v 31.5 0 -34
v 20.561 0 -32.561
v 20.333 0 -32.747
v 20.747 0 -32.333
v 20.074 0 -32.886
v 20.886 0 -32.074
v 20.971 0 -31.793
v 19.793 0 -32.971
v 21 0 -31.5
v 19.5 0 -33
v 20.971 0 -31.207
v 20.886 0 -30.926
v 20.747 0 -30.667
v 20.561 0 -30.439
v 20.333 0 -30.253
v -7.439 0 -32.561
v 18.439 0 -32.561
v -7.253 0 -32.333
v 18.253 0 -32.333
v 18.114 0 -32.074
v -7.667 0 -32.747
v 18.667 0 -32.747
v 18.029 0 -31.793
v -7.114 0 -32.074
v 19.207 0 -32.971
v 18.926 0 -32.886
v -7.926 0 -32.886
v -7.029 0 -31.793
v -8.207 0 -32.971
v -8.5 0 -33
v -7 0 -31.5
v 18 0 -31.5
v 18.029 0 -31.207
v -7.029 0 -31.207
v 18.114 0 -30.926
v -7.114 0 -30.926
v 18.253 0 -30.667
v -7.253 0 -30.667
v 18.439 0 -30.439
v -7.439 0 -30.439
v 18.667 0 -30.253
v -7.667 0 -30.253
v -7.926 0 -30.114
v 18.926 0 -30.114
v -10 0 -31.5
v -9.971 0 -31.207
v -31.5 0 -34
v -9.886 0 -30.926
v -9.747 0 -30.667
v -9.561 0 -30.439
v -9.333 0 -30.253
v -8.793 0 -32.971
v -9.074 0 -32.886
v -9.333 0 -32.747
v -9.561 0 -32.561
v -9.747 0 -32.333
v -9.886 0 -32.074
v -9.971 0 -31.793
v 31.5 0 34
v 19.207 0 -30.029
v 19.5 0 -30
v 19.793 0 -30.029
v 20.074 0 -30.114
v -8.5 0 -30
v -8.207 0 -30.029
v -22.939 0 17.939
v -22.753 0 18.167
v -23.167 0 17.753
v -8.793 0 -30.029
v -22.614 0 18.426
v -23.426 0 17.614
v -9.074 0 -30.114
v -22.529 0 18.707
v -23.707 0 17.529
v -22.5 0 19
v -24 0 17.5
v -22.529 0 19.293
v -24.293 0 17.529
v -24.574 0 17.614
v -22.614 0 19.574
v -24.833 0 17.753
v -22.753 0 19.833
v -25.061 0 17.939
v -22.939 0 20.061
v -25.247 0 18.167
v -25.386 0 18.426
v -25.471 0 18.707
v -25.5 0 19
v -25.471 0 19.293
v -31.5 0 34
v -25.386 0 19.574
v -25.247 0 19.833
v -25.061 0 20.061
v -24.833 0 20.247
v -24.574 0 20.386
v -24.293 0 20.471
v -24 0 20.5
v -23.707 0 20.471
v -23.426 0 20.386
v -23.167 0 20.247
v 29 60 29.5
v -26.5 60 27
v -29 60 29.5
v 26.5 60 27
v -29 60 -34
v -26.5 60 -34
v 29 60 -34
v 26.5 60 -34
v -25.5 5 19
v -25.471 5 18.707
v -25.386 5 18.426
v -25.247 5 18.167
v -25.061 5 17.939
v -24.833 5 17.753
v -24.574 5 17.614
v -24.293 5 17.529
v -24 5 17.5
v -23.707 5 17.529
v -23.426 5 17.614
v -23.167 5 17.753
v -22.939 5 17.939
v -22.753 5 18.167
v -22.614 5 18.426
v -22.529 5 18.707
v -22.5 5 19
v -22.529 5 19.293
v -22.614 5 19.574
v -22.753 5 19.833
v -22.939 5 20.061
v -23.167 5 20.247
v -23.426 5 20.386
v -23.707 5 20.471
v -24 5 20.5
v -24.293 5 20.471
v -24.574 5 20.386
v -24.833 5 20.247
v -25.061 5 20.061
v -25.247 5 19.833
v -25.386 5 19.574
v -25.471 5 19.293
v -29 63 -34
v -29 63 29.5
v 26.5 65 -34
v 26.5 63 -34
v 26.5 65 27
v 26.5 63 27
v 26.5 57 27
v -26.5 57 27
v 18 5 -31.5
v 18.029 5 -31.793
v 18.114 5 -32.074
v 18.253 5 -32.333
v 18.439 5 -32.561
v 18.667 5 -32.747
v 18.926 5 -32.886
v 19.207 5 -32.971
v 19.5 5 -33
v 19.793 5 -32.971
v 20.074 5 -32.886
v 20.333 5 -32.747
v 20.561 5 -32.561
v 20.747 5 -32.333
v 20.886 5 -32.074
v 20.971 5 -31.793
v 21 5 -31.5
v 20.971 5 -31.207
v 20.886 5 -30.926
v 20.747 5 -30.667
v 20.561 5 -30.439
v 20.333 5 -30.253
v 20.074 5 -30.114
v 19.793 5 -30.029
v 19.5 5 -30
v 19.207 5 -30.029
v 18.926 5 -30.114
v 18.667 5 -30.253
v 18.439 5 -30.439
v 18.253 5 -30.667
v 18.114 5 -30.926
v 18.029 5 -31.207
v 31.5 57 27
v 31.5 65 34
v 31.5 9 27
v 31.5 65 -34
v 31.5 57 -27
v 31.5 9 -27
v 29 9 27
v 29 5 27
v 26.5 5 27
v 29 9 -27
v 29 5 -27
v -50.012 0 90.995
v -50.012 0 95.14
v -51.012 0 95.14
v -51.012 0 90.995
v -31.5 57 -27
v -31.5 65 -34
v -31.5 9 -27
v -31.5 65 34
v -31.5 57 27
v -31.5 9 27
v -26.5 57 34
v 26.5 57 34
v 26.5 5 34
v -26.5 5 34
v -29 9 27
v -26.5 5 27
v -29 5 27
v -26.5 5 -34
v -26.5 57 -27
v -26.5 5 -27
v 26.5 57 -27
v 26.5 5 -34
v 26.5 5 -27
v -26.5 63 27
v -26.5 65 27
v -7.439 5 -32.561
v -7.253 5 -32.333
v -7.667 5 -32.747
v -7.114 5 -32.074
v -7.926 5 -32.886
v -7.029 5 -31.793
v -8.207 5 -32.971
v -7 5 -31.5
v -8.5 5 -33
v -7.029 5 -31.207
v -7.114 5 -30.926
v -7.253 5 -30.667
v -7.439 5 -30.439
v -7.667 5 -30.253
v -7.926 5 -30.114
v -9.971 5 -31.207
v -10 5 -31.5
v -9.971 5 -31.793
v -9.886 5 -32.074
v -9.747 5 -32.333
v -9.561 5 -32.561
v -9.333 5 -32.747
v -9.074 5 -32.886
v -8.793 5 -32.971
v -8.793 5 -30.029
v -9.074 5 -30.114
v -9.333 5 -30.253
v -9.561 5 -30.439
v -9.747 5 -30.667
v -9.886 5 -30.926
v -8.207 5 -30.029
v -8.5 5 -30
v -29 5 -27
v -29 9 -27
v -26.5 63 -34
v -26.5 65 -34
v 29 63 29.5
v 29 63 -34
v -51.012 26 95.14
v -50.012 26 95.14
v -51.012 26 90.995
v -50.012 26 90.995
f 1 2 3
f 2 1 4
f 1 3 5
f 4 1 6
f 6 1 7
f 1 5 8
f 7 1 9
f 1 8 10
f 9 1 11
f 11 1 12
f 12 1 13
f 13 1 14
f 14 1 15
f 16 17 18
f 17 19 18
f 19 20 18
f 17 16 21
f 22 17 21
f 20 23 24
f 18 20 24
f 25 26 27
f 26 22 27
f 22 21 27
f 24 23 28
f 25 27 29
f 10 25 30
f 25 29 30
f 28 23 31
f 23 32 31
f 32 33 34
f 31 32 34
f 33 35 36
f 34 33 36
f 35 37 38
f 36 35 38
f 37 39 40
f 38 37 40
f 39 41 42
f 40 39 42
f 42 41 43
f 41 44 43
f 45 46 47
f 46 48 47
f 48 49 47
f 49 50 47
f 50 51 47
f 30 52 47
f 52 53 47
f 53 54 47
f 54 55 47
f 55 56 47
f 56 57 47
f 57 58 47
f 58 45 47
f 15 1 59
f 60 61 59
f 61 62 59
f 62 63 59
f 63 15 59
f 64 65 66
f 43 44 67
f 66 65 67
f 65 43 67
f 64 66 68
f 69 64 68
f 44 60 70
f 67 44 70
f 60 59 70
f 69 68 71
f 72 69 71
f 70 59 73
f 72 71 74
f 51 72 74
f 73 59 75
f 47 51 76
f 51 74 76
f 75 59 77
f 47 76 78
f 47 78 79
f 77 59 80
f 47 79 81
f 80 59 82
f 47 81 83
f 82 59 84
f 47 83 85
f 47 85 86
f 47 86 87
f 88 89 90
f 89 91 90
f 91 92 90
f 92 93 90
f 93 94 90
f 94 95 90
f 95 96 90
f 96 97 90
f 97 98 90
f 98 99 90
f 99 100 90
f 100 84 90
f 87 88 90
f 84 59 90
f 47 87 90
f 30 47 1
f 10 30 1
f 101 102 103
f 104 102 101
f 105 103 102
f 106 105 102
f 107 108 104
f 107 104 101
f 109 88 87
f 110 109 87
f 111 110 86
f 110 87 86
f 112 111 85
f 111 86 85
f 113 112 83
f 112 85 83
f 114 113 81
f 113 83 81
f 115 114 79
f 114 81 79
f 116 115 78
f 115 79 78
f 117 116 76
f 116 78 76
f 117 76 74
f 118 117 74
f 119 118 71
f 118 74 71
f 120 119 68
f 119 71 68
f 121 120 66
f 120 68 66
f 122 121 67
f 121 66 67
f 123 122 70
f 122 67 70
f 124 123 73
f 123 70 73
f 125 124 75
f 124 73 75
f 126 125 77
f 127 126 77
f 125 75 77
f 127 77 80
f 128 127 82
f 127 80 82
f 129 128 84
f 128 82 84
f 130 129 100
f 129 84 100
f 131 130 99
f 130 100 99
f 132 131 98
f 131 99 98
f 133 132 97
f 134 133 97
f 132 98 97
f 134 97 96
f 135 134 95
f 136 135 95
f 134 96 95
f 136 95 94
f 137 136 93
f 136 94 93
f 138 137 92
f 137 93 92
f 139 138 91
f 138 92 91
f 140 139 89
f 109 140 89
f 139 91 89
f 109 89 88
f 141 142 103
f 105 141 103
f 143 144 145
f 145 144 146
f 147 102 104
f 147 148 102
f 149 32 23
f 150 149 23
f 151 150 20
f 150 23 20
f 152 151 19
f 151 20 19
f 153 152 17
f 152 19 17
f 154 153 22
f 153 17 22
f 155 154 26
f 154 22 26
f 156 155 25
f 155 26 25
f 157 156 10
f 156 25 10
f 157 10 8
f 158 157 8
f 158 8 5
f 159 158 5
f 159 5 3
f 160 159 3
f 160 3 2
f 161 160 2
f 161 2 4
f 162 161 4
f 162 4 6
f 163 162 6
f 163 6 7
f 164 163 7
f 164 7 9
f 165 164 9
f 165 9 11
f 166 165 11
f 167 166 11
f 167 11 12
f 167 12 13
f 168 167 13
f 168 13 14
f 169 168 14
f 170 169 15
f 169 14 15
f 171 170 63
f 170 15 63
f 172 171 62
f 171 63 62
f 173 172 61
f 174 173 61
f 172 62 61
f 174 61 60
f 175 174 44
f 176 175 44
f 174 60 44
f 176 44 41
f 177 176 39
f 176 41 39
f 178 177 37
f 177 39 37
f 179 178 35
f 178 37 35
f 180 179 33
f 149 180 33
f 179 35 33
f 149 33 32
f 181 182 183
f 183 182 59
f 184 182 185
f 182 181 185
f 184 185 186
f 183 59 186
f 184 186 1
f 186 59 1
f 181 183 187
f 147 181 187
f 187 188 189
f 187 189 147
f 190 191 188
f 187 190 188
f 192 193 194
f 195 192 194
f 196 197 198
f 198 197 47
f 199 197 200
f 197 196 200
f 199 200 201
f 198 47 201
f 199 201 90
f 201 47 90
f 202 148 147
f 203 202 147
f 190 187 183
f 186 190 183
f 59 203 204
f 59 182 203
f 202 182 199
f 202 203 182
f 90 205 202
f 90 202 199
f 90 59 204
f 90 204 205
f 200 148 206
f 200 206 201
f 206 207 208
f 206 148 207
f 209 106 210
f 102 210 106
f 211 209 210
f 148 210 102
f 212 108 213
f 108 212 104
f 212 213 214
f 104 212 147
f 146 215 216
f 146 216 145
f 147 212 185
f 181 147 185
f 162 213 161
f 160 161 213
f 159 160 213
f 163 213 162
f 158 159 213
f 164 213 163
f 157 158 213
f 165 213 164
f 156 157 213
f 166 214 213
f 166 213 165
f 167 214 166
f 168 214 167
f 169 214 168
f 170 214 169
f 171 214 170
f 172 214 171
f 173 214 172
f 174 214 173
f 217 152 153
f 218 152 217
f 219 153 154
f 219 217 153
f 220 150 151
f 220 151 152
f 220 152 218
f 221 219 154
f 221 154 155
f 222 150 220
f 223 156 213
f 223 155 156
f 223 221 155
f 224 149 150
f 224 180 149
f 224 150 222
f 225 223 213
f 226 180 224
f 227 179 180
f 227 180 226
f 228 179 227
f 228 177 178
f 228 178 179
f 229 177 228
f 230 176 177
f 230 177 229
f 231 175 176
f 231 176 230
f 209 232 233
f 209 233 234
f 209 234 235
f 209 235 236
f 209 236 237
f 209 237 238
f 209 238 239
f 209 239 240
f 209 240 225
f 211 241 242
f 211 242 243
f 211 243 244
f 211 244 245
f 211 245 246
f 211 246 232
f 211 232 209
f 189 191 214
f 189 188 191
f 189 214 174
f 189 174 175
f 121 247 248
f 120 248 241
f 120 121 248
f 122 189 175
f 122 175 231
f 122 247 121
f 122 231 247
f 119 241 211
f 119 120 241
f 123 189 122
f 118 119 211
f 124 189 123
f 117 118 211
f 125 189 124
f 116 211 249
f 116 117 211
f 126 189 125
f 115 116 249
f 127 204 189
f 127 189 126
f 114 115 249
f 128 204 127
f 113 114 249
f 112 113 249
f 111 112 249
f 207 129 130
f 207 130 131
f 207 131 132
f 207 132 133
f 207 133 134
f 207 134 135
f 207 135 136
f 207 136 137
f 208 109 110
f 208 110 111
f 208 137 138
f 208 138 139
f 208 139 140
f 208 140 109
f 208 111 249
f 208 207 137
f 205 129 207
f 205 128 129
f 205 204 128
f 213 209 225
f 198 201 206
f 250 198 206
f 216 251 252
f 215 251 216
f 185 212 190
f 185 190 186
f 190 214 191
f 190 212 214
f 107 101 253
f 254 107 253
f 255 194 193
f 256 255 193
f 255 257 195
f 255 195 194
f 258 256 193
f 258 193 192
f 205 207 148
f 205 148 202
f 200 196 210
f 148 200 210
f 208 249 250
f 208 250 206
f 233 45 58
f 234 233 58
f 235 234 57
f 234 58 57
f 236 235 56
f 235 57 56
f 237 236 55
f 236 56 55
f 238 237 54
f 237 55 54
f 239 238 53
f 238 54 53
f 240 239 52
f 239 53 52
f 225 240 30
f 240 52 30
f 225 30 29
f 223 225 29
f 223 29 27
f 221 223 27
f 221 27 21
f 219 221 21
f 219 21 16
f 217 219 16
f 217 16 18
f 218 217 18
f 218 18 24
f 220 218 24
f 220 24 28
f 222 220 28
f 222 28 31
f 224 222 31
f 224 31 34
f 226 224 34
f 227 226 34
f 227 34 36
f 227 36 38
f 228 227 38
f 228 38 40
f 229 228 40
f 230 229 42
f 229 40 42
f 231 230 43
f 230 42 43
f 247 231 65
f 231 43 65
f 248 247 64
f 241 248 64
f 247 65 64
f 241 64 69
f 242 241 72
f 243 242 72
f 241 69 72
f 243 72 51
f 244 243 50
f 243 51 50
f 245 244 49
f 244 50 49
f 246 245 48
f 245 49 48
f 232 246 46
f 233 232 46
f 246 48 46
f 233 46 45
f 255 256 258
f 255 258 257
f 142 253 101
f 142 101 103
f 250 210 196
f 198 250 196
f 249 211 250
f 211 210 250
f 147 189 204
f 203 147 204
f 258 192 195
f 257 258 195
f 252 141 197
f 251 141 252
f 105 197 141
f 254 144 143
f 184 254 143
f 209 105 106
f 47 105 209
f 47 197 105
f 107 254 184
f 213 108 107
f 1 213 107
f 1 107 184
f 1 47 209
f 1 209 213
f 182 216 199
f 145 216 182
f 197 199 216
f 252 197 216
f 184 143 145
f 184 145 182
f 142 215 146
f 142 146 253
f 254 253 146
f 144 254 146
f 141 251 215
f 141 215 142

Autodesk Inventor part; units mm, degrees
ref_plane "YZ Plane" through (0, 0, 0) normal (1, 0, 0) x (0, 1, 0)
ref_plane "XZ Plane" through (0, 0, 0) normal (0, 1, 0) x (-1, 0, 0)
ref_plane "XY Plane" through (0, 0, 0) normal (0, 0, 1) x (1, 0, 0)
sketch "Sketch1" plane through (0, 0, 0) normal (0, 1, 0) x (-1, 0, 0)
  line L0 (-26.5, 34) -> (26.5, 34)
  line L1 (26.5, 34) -> (26.5, -34)
  line L2 (26.5, -34) -> (-26.5, -34)
  line L3 (-26.5, -34) -> (-26.5, 34)
  line L4 (-26.5, 34) -> (26.5, -34) construction
  line L5 (26.5, 34) -> (-26.5, -34) construction
  line L6 (26.5, 34) -> (26.5, 19)
  line L7 (-26.5, -34) -> (-19.5, -34)
  line L8 (-26.5, -34) -> (8.5, -34)
  circle A0 centre (8.5, -31.5) radius 1.5
  circle A1 centre (-19.5, -31.5) radius 1.5
  line L9 (-19.5, -33) -> (-19.5, -34)
  line L10 (8.5, -33) -> (8.5, -34)
  circle A2 centre (-19.5, -31.5) radius 1.5
  circle A3 centre (24, 19) radius 1.5
  line L11 (25.5, 19) -> (26.5, 19)
  line L12 (26.5, 19) -> (25.5, 19)
  line L13 (24, 19) -> (0, 19)
  line L14 (0, 19) -> (0, 0)
  line L15 (0, 0) -> (8.5, -31.5)
  line L16 (8.5, -31.5) -> (0, -31.5)
  line L17 (-19.5, -31.5) -> (-19.5, 0)
  line L18 (-19.5, 0) -> (0, 0)
  line L19 (26.5, 34) -> (31.5, 34)
  line L20 (-31.5, -34) -> (31.5, -34)
  line L21 (31.5, -34) -> (31.5, 34)
  line L22 (31.5, 34) -> (-31.5, 34)
  line L23 (-31.5, 34) -> (-31.5, -34)
  line L24 (-31.5, -34) -> (31.5, 34) construction
  line L25 (31.5, -34) -> (-31.5, 34) construction
  dimension "d5" = 3
  dimension "d6" = 3
  dimension "d7" = 3
  dimension "d0" = 53
  dimension "d1" = 68
  dimension "d2" = 15
  dimension "d3" = 7
  dimension "d4" = 35
  dimension "d8" = 1
  dimension "d9" = 1
  dimension "d10" = 5
extrude "Extrusion1" add sketch "Sketch1" along normal blind 5 contours L0 L1 L11 A3 L13 L14 L18 L17 A1 L9 L2 L3 | L3 L20 L23 L22 | L19 L21 L20 L1 | L1 L2 L10 A0 L15 L14 L13 A3 L11 | L9 A1 L17 L18 L15 A0 L10 L2
sketch "Sketch2" plane through (0, 0, 0) normal (0, 1, 0) x (-1, 0, 0)
  line L0 (51.0115, 95.1402) -> (50.0115, 95.1402)
  line L1 (50.0115, 95.1402) -> (50.0115, 90.9953)
  line L2 (50.0115, 90.9953) -> (51.0115, 90.9953)
  line L3 (51.0115, 90.9953) -> (51.0115, 95.1402)
  point P0 (0, 0)
  dimension "d13" = 1
extrude "Extrusion2" add sketch "Sketch2" along normal blind 26
sketch "Sketch3" plane through (0, 5, 0) normal (0, 1, 0) x (1, 0, 0)
  line L0 (31.5, -34) -> (-31.5, -34)
  line L1 (-31.5, -34) -> (-31.5, 34)
  line L2 (-31.5, 34) -> (31.5, 34)
  line L3 (31.5, 34) -> (31.5, -34)
  line L4 (31.5, -34) -> (-31.5, 34) construction
  line L5 (-31.5, -34) -> (31.5, 34) construction
  line L6 (-31.5, -34) -> (31.5, -34) projected
  line L7 (-31.5, 34) -> (-26.5, 34)
  line L8 (-26.5, 34) -> (-26.5, -34)
  line L9 (-26.5, -34) -> (-31.5, -34)
  line L10 (-31.5, -34) -> (-31.5, 34)
  line L11 (31.5, -34) -> (31.5, 34) projected
  line L12 (31.5, 34) -> (26.5, 34)
  line L13 (26.5, 34) -> (26.5, -34)
  line L14 (26.5, -34) -> (31.5, -34)
  line L15 (31.5, -34) -> (31.5, 34)
  line L16 (-31.5, -34) -> (-26.5, -34)
  line L17 (-26.5, -34) -> (-26.5, -27)
  line L18 (-26.5, -27) -> (-31.5, -27)
  line L19 (-31.5, -27) -> (-31.5, -34)
  line L20 (-31.5, 34) -> (-26.5, 34)
  line L21 (-26.5, 34) -> (-26.5, 27)
  line L22 (-26.5, 27) -> (-31.5, 27)
  line L23 (-31.5, 27) -> (-31.5, 34)
  line L24 (31.5, 34) -> (26.5, 34)
  line L25 (26.5, 34) -> (26.5, 27)
  line L26 (26.5, 27) -> (31.5, 27)
  line L27 (31.5, 27) -> (31.5, 34)
  line L28 (26.5, -34) -> (31.5, -34)
  line L29 (31.5, -34) -> (31.5, -27)
  line L30 (31.5, -27) -> (26.5, -27)
  line L31 (26.5, -27) -> (26.5, -34)
  point P0 (0, 0)
  dimension "d16" = 5
  dimension "d17" = 5
  dimension "d18" = 5
  dimension "d19" = 7
  dimension "d20" = 5
  dimension "d21" = 7
  dimension "d22" = 5
  dimension "d23" = 7
  dimension "d24" = 5
  dimension "d25" = 7
extrude "Extrusion3" add sketch "Sketch3" along normal blind 52 contours L0 L13 L30 L3 | L0 L1 L18 L8 | L26 L13 L2 L3 | L22 L1 L2 L8
sketch "Sketch4" plane through (0, 5, 0) normal (0, 1, 0) x (1, 0, 0)
  line L0 (-31.5, 27) -> (-31.5, -27) projected
  line L1 (-26.5, -27) -> (-26.5, -34) projected
  line L2 (-31.5, 27) -> (-26.5, 27)
  line L3 (-26.5, 27) -> (-26.5, -27)
  line L4 (-26.5, -27) -> (-31.5, -27)
  line L5 (-31.5, -27) -> (-31.5, 27)
  line L6 (31.5, -27) -> (31.5, 27) projected
  line L7 (31.5, 27) -> (26.5, 27)
  line L8 (26.5, 27) -> (26.5, -27)
  line L9 (26.5, -27) -> (31.5, -27)
  line L10 (31.5, -27) -> (31.5, 27)
  line L11 (31.5, -27) -> (26.5, -27) projected
  line L12 (31.5, 27) -> (29, 27)
  line L13 (29, 27) -> (29, -27)
  line L14 (29, -27) -> (31.5, -27)
  line L15 (31.5, -27) -> (31.5, 27)
  line L16 (-26.5, -27) -> (-31.5, -27) projected
  line L17 (-31.5, 27) -> (-29, 27)
  line L18 (-29, 27) -> (-29, -27)
  line L19 (-29, -27) -> (-31.5, -27)
  line L20 (-31.5, -27) -> (-31.5, 27)
  point P0 (0, 0)
extrude "Extrusion4" add sketch "Sketch4" along normal blind 4 contours L2 L18 L4 L0 | L9 L13 L7 L6
sketch "Sketch5" plane through (0, 57, 0) normal (0, 1, 0) x (1, 0, 0)
  line L0 (31.5, 34) -> (-31.5, 34) projected
  line L1 (-26.5, -34) -> (-26.5, -27) projected
  line L2 (-31.5, 34) -> (-26.5, 34)
  line L3 (-26.5, 34) -> (-26.5, -34)
  line L4 (-26.5, -34) -> (-31.5, -34)
  line L5 (-31.5, -34) -> (-31.5, 34)
  line L6 (-26.5, -27) -> (31.5, -27)
  line L7 (31.5, -27) -> (31.5, -34)
  line L8 (31.5, -34) -> (-26.5, -34)
  line L9 (-26.5, -34) -> (-26.5, -27)
  line L10 (26.5, -27) -> (26.5, -34) projected
  line L11 (26.5, -27) -> (31.5, -27)
  line L12 (31.5, -27) -> (31.5, 34)
  line L13 (31.5, 34) -> (26.5, 34)
  line L14 (26.5, 34) -> (26.5, -27)
  line L15 (-26.5, 27) -> (-26.5, 34) projected
  line L16 (-26.5, 34) -> (-26.5, 27)
  line L17 (26.5, 27) -> (26.5, 34)
  point P0 (0, 0)
extrude "Extrusion5" add sketch "Sketch5" along normal blind 8 contours L12 L6 L14 L0 | L7 L8 L10 L6 | L3 L1 L4 L5 L0 | L10 L8 L1 L6
sketch "Sketch6" plane through (31.5, 0, -34) normal (0, 0, -1) x (-1, 0, 0)
  line L0 (0, 0) -> (0, 65) projected
  line L1 (5, 5) -> (5, 57) projected
  line L2 (0, 65) -> (5, 65)
  line L3 (5, 63) -> (5, 60)
  line L4 (5, 57) -> (0, 57)
  line L5 (0, 57) -> (0, 65)
  line L6 (58, 5) -> (58, 57) projected
  line L7 (63, 0) -> (63, 65) projected
  line L8 (58, 57) -> (63, 57)
  line L9 (63, 57) -> (63, 65)
  line L10 (63, 65) -> (58, 65)
  line L11 (58, 65) -> (58, 57)
  line L12 (5, 57) -> (5, 60)
  line L13 (5, 5) -> (5, 65) projected
  line L14 (5, 60) -> (2.5, 60)
  line L15 (2.5, 60) -> (2.5, 63)
  line L16 (2.5, 63) -> (5, 63)
  line L17 (58, 57) -> (5, 57) projected
  line L18 (58, 57) -> (60.5, 57)
  line L19 (63, 57) -> (58, 57) projected
  line L20 (60.5, 60) -> (58, 60)
  line L21 (58, 5) -> (58, 65) projected
  line L22 (58, 60) -> (58, 63)
  line L23 (58, 63) -> (60.5, 63)
  line L24 (60.5, 63) -> (60.5, 60)
  line L25 (5, 63) -> (5, 60)
  point P0 (31.5, 0)
  point P1 (59.25, 63)
  point P2 (59.25, 60)
  dimension "d32" = 3
  dimension "d33" = 3
extrude "Extrusion6" cut sketch "Sketch6" against normal up to surface (61 mm away) contours L14 L15 L16 L3 | L11 L23 L24 L20
sketch "Sketch7" plane through (26.5, 57, 27) normal (0, 0, -1) x (-1, 0, 0)
  line L0 (-2.5, 3) -> (-2.5, 6) projected
  line L1 (55.5, 3) -> (53, 3) projected
  line L2 (-2.5, 6) -> (55.5, 6)
  line L3 (55.5, 6) -> (55.5, 3)
  line L4 (55.5, 3) -> (-2.5, 3)
  line L5 (-2.5, 3) -> (-2.5, 6)
  point P0 (26.5, -57)
extrude "Extrusion7" cut sketch "Sketch7" against normal blind 2.5
properties part number "Frame_+_Slide_Top"
